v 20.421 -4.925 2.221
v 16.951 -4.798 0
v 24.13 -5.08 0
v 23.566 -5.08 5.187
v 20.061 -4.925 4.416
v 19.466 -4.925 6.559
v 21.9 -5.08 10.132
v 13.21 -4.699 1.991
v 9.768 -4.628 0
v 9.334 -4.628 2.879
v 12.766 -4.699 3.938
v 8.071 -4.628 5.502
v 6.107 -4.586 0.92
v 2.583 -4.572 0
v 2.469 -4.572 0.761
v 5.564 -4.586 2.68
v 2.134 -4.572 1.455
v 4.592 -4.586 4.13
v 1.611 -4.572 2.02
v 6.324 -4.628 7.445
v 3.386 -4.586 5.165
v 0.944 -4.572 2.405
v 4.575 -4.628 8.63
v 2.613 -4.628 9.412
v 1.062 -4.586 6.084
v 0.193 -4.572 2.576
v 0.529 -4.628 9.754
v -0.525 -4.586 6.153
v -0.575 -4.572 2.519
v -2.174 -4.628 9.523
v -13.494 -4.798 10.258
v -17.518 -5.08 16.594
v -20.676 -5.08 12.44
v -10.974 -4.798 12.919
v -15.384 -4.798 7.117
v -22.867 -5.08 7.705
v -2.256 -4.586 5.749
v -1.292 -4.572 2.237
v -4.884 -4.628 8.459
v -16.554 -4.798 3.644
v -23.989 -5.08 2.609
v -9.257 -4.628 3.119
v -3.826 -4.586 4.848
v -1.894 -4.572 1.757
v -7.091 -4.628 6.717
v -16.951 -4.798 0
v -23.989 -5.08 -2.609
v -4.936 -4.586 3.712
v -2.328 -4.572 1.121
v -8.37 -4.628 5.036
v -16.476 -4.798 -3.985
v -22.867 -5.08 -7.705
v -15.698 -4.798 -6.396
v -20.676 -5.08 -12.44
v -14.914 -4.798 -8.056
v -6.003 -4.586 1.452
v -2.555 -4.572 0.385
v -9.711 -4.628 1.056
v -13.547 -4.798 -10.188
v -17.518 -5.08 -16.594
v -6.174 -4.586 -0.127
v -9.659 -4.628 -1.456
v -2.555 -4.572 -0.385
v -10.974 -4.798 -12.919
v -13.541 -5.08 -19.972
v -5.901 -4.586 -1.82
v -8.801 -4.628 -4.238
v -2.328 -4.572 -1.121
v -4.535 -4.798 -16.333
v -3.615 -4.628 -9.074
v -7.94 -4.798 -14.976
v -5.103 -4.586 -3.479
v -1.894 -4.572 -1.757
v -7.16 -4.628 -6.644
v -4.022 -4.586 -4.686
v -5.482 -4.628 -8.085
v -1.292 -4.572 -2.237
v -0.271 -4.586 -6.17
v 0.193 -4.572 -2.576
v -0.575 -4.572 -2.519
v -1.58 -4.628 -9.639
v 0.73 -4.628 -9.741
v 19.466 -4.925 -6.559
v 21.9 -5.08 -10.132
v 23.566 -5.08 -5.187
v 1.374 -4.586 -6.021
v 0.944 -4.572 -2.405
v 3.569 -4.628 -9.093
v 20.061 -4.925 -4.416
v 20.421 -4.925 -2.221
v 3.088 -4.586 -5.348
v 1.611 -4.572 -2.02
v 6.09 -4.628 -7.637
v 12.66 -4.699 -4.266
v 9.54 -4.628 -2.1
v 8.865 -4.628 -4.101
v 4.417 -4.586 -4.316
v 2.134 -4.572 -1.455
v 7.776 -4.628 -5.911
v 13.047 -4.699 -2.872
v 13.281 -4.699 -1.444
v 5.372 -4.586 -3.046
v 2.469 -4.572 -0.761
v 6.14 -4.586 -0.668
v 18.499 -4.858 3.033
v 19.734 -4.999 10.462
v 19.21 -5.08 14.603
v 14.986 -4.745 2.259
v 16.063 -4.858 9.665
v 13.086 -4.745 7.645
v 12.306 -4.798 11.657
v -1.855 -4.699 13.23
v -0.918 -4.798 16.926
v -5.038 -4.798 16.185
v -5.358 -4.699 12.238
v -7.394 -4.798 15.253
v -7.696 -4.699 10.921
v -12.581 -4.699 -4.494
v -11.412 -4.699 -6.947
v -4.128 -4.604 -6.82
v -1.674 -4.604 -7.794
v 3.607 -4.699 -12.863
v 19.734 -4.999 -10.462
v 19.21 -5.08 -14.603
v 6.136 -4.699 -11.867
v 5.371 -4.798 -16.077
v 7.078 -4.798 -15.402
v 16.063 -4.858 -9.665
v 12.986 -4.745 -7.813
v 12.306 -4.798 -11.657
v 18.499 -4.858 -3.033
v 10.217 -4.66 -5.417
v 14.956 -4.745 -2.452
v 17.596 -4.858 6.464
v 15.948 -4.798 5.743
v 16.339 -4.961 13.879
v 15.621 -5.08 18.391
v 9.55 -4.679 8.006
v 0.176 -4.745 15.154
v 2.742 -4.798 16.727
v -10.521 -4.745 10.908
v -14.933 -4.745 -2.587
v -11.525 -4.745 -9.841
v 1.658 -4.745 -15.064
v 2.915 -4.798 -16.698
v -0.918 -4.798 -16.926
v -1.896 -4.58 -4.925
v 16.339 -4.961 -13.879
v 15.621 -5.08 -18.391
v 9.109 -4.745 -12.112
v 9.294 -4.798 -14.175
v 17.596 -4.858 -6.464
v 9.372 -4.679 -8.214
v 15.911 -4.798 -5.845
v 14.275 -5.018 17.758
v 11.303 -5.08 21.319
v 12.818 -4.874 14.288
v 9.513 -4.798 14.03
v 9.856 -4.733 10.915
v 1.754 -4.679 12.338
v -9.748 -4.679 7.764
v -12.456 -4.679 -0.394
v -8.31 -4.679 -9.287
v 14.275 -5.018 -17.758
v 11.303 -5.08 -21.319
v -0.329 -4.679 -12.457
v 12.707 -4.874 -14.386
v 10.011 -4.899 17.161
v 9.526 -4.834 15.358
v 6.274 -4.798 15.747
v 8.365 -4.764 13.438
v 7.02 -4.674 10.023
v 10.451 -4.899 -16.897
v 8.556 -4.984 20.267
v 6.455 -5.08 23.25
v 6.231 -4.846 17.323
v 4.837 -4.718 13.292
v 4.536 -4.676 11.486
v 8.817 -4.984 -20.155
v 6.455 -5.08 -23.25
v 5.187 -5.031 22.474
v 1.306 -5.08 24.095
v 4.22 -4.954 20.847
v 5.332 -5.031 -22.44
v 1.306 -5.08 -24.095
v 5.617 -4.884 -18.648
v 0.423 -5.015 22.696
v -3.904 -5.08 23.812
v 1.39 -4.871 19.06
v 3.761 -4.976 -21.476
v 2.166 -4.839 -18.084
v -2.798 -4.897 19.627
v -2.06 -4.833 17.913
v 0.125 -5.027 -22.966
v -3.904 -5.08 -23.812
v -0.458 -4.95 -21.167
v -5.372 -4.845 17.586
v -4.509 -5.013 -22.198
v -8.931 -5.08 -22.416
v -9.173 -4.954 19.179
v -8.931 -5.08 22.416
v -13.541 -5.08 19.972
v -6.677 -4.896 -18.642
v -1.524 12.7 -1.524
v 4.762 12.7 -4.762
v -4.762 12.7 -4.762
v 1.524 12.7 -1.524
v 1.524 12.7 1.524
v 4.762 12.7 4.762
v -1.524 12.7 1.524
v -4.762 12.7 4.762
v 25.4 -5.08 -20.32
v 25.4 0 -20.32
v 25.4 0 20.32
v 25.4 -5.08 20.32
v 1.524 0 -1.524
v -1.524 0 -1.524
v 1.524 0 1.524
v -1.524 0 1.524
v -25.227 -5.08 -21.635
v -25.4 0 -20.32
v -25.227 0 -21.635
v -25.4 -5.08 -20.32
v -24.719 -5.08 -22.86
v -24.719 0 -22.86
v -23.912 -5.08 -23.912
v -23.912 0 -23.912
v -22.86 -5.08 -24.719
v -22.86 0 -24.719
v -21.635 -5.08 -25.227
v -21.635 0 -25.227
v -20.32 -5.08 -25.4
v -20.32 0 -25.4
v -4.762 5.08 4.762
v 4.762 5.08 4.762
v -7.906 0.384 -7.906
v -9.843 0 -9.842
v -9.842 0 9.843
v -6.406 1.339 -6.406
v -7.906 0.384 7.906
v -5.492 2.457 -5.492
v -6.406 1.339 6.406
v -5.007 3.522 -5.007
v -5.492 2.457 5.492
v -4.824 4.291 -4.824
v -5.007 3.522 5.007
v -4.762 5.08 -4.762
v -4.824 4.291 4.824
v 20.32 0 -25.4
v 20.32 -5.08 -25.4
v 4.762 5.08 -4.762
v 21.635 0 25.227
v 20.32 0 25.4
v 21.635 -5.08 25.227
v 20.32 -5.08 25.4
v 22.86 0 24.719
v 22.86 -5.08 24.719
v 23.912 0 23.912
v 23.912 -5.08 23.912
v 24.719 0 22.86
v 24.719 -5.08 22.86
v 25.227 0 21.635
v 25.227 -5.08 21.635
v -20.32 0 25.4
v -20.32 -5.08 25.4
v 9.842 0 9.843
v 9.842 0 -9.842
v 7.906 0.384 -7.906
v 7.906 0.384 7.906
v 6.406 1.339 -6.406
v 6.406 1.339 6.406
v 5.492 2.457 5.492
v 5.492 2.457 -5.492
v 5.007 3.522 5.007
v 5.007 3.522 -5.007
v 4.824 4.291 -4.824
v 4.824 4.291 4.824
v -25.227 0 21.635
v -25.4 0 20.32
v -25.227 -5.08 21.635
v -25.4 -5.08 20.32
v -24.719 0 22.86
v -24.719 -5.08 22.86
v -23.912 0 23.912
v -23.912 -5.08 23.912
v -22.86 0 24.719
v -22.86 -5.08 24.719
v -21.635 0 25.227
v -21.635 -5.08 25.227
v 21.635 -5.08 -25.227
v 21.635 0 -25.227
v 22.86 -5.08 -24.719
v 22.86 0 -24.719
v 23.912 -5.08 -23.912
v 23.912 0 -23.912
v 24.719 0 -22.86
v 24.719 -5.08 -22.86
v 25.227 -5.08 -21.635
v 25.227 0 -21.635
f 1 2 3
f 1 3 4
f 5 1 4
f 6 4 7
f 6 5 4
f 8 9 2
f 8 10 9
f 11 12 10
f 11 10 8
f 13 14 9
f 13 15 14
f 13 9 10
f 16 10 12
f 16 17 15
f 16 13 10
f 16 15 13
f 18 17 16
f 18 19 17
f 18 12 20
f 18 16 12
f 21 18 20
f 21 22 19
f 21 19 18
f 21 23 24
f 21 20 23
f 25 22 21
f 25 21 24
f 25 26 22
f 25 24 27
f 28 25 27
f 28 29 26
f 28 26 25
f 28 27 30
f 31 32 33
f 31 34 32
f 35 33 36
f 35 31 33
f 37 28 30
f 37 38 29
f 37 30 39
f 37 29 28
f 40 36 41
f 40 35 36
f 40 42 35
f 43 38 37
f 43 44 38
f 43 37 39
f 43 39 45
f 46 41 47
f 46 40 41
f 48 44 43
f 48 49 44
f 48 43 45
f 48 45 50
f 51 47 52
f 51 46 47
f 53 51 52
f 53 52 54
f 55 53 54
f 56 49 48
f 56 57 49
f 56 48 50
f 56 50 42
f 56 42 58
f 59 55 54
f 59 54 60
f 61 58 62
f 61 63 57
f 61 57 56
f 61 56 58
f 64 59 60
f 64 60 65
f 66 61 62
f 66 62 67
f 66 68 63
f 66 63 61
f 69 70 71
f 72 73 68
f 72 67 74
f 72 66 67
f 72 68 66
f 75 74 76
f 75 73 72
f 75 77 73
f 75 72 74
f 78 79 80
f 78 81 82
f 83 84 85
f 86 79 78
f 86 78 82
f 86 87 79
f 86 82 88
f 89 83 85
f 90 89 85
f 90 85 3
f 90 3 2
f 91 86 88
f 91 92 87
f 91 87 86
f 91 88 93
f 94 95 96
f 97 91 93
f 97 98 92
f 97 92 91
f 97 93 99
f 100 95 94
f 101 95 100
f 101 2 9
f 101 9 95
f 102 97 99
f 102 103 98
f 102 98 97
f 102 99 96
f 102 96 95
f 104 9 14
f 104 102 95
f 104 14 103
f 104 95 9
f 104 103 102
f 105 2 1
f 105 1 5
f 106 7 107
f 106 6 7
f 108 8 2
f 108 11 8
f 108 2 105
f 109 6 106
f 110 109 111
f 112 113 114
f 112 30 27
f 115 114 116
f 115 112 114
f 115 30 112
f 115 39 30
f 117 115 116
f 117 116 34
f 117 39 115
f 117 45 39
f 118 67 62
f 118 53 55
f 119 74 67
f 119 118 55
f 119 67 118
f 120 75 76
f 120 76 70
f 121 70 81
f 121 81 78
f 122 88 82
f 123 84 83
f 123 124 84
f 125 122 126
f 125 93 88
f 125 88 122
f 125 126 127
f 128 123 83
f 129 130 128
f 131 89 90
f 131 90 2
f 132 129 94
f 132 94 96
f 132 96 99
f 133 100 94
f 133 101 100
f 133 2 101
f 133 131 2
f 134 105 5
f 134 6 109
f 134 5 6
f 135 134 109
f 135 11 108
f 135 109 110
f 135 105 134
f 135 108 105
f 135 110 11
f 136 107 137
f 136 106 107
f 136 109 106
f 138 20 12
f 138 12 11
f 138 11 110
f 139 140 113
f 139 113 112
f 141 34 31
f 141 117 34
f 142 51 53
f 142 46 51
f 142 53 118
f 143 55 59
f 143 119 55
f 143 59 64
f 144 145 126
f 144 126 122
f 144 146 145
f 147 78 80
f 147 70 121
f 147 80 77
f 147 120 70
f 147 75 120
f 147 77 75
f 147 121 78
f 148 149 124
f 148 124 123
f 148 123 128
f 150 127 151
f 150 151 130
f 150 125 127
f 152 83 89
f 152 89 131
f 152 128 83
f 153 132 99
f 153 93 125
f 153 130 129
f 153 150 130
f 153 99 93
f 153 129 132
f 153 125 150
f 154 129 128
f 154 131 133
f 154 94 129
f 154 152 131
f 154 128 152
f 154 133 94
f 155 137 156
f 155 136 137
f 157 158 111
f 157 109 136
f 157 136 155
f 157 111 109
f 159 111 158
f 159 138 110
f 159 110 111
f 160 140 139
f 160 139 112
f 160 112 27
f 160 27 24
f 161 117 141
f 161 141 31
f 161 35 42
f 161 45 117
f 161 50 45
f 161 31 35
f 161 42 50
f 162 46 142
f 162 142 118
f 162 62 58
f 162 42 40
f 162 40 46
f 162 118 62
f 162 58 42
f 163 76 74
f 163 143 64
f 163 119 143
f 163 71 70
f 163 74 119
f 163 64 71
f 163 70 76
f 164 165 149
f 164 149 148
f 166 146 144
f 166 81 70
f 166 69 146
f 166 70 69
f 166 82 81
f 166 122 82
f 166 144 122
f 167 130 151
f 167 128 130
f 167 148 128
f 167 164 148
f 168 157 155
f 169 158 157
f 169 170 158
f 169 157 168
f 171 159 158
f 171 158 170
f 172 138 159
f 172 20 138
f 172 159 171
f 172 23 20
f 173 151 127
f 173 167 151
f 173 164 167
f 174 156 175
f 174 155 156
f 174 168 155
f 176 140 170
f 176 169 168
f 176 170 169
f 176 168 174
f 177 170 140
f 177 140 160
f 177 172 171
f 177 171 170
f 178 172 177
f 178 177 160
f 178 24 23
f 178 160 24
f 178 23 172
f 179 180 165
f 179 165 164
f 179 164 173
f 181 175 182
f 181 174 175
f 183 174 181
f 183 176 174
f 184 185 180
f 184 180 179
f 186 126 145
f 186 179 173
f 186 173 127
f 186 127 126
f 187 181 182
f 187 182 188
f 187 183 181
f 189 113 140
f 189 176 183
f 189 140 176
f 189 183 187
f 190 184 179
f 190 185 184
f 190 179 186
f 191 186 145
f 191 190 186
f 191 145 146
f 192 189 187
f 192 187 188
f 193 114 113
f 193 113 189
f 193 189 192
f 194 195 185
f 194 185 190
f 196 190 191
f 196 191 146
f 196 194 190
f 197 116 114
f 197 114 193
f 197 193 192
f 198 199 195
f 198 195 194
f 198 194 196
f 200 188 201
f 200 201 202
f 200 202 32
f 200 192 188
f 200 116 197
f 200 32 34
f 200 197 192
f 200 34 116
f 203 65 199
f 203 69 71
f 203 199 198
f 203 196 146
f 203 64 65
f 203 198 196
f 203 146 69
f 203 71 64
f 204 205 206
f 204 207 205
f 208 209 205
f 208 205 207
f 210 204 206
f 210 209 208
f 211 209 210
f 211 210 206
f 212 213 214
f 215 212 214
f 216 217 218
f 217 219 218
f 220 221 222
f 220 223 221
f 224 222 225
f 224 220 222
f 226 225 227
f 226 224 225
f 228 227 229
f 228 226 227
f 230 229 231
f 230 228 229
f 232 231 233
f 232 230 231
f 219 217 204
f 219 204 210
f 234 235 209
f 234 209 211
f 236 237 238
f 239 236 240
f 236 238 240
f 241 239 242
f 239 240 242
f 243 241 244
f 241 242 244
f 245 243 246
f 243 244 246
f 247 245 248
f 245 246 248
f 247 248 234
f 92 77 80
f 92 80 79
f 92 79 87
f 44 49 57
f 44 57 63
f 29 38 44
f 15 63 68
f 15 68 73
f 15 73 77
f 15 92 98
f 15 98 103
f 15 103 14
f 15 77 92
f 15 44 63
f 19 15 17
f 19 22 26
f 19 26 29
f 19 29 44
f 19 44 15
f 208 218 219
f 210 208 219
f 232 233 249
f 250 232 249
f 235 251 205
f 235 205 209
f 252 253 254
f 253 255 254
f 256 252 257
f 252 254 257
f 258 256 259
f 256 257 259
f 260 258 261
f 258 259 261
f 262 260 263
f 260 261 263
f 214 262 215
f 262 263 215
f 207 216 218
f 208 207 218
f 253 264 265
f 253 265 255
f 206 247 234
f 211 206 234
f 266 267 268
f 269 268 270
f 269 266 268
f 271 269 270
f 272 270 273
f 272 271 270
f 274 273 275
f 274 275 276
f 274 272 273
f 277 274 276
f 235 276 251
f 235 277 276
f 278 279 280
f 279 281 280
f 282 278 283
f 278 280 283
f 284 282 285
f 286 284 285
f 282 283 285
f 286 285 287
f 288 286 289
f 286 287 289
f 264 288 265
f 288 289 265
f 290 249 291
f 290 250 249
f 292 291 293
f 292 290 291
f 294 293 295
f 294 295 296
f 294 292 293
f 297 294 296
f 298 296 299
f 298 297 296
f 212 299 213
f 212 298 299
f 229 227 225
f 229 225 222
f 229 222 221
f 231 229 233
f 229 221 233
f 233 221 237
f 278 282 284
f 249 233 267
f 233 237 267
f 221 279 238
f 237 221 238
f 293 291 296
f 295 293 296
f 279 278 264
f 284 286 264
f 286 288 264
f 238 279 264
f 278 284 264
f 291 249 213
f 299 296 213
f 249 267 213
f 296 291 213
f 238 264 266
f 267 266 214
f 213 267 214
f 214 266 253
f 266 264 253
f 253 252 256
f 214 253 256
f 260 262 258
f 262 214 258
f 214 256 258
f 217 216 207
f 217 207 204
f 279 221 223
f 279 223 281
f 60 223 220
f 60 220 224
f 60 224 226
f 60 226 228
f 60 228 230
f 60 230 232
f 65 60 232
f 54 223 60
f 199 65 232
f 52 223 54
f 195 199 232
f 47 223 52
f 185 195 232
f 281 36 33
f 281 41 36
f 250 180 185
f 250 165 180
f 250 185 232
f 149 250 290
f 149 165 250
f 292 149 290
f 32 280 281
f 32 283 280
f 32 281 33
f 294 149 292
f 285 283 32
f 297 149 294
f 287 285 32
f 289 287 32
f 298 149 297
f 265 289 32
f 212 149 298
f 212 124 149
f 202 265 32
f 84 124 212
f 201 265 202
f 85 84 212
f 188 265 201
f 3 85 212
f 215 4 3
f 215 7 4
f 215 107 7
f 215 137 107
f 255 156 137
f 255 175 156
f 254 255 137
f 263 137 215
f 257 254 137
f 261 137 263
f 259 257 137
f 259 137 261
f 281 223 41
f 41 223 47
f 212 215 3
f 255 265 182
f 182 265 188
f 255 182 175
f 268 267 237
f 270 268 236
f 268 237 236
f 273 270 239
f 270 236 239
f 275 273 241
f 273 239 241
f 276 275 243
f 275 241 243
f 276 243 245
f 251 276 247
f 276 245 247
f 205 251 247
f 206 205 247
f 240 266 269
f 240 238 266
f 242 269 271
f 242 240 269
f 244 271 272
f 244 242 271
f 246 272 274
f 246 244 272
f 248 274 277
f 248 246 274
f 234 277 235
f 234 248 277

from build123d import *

# Parameters (mm, degrees)
F0_W     = 50.8
F0_H     = 50.8
F1_DEPTH = 5.08
F2_W     = 9.525
F2_H     = 9.525
F2_W_2   = 3.048
F2_H_2   = 3.048
F3_DEPTH = 12.7
F4_R     = 5.08
F5_R     = 5.08
F6_R     = 24.13
F7_DEPTH = 0.508


# Not quite as in the source:
# - a fillet or chamfer that OpenCascade refuses, or shapes differently, is made with other operations: its cross-section is extruded or revolved along the edge and cut away or added


with BuildPart() as f1:
    # F0 (on Front) → F1 (new body)
    with BuildSketch(Plane.XZ):
        Rectangle(F0_W, F0_H)
    extrude(amount=F1_DEPTH)

    # F2 (on face) → F3 (join)
    with BuildSketch(Plane(origin=(0, 0, 0), x_dir=(-1, 0, 0), z_dir=(0, 1, 0))):
        Rectangle(F2_W, F2_H)
        Rectangle(F2_W_2, F2_H_2, mode=Mode.SUBTRACT)
    extrude(amount=F3_DEPTH)

    # F4
    f4_edges = [f1.edges().sort_by_distance(p)[0] for p in [
        (0, 0, -4.7625),
        (-4.7625, 0, 0),
        (4.7625, 0, 0),
        (0, 0, 4.7625),
    ]]
    fillet(f4_edges, radius=F4_R)

    # F5
    f5_edges = [f1.edges().sort_by_distance(p)[0] for p in [
        (-25.4, -2.54, 25.4),
        (-25.4, -2.54, -25.4),
        (25.4, -2.54, 25.4),
        (25.4, -2.54, -25.4),
    ]]
    fillet(f5_edges, radius=F5_R)

    # F6 (on face) → F7 (cut)
    with BuildSketch(Plane.XZ.offset(5.08)):
        Circle(F6_R)
    extrude(amount=-F7_DEPTH, mode=Mode.SUBTRACT)

    # F8: fillet of radius 457.2 on 1 edges, made by hand

    # F8_s1 → F8_t2 (revolve)
    with BuildSketch(Plane.XY):
        with BuildLine():
            ThreePointArc((24.13, -5.08), (13.3596803239, -4.6990176438), (2.5833729786, -4.572))
            Line((2.5833729786, -4.572), (24.13, -4.572))
            Line((24.13, -4.572), (24.13, -5.08))
        make_face()
    revolve(axis=Axis((0, -4.572, 0), (0, -1, 0)))


solid = f1.part
